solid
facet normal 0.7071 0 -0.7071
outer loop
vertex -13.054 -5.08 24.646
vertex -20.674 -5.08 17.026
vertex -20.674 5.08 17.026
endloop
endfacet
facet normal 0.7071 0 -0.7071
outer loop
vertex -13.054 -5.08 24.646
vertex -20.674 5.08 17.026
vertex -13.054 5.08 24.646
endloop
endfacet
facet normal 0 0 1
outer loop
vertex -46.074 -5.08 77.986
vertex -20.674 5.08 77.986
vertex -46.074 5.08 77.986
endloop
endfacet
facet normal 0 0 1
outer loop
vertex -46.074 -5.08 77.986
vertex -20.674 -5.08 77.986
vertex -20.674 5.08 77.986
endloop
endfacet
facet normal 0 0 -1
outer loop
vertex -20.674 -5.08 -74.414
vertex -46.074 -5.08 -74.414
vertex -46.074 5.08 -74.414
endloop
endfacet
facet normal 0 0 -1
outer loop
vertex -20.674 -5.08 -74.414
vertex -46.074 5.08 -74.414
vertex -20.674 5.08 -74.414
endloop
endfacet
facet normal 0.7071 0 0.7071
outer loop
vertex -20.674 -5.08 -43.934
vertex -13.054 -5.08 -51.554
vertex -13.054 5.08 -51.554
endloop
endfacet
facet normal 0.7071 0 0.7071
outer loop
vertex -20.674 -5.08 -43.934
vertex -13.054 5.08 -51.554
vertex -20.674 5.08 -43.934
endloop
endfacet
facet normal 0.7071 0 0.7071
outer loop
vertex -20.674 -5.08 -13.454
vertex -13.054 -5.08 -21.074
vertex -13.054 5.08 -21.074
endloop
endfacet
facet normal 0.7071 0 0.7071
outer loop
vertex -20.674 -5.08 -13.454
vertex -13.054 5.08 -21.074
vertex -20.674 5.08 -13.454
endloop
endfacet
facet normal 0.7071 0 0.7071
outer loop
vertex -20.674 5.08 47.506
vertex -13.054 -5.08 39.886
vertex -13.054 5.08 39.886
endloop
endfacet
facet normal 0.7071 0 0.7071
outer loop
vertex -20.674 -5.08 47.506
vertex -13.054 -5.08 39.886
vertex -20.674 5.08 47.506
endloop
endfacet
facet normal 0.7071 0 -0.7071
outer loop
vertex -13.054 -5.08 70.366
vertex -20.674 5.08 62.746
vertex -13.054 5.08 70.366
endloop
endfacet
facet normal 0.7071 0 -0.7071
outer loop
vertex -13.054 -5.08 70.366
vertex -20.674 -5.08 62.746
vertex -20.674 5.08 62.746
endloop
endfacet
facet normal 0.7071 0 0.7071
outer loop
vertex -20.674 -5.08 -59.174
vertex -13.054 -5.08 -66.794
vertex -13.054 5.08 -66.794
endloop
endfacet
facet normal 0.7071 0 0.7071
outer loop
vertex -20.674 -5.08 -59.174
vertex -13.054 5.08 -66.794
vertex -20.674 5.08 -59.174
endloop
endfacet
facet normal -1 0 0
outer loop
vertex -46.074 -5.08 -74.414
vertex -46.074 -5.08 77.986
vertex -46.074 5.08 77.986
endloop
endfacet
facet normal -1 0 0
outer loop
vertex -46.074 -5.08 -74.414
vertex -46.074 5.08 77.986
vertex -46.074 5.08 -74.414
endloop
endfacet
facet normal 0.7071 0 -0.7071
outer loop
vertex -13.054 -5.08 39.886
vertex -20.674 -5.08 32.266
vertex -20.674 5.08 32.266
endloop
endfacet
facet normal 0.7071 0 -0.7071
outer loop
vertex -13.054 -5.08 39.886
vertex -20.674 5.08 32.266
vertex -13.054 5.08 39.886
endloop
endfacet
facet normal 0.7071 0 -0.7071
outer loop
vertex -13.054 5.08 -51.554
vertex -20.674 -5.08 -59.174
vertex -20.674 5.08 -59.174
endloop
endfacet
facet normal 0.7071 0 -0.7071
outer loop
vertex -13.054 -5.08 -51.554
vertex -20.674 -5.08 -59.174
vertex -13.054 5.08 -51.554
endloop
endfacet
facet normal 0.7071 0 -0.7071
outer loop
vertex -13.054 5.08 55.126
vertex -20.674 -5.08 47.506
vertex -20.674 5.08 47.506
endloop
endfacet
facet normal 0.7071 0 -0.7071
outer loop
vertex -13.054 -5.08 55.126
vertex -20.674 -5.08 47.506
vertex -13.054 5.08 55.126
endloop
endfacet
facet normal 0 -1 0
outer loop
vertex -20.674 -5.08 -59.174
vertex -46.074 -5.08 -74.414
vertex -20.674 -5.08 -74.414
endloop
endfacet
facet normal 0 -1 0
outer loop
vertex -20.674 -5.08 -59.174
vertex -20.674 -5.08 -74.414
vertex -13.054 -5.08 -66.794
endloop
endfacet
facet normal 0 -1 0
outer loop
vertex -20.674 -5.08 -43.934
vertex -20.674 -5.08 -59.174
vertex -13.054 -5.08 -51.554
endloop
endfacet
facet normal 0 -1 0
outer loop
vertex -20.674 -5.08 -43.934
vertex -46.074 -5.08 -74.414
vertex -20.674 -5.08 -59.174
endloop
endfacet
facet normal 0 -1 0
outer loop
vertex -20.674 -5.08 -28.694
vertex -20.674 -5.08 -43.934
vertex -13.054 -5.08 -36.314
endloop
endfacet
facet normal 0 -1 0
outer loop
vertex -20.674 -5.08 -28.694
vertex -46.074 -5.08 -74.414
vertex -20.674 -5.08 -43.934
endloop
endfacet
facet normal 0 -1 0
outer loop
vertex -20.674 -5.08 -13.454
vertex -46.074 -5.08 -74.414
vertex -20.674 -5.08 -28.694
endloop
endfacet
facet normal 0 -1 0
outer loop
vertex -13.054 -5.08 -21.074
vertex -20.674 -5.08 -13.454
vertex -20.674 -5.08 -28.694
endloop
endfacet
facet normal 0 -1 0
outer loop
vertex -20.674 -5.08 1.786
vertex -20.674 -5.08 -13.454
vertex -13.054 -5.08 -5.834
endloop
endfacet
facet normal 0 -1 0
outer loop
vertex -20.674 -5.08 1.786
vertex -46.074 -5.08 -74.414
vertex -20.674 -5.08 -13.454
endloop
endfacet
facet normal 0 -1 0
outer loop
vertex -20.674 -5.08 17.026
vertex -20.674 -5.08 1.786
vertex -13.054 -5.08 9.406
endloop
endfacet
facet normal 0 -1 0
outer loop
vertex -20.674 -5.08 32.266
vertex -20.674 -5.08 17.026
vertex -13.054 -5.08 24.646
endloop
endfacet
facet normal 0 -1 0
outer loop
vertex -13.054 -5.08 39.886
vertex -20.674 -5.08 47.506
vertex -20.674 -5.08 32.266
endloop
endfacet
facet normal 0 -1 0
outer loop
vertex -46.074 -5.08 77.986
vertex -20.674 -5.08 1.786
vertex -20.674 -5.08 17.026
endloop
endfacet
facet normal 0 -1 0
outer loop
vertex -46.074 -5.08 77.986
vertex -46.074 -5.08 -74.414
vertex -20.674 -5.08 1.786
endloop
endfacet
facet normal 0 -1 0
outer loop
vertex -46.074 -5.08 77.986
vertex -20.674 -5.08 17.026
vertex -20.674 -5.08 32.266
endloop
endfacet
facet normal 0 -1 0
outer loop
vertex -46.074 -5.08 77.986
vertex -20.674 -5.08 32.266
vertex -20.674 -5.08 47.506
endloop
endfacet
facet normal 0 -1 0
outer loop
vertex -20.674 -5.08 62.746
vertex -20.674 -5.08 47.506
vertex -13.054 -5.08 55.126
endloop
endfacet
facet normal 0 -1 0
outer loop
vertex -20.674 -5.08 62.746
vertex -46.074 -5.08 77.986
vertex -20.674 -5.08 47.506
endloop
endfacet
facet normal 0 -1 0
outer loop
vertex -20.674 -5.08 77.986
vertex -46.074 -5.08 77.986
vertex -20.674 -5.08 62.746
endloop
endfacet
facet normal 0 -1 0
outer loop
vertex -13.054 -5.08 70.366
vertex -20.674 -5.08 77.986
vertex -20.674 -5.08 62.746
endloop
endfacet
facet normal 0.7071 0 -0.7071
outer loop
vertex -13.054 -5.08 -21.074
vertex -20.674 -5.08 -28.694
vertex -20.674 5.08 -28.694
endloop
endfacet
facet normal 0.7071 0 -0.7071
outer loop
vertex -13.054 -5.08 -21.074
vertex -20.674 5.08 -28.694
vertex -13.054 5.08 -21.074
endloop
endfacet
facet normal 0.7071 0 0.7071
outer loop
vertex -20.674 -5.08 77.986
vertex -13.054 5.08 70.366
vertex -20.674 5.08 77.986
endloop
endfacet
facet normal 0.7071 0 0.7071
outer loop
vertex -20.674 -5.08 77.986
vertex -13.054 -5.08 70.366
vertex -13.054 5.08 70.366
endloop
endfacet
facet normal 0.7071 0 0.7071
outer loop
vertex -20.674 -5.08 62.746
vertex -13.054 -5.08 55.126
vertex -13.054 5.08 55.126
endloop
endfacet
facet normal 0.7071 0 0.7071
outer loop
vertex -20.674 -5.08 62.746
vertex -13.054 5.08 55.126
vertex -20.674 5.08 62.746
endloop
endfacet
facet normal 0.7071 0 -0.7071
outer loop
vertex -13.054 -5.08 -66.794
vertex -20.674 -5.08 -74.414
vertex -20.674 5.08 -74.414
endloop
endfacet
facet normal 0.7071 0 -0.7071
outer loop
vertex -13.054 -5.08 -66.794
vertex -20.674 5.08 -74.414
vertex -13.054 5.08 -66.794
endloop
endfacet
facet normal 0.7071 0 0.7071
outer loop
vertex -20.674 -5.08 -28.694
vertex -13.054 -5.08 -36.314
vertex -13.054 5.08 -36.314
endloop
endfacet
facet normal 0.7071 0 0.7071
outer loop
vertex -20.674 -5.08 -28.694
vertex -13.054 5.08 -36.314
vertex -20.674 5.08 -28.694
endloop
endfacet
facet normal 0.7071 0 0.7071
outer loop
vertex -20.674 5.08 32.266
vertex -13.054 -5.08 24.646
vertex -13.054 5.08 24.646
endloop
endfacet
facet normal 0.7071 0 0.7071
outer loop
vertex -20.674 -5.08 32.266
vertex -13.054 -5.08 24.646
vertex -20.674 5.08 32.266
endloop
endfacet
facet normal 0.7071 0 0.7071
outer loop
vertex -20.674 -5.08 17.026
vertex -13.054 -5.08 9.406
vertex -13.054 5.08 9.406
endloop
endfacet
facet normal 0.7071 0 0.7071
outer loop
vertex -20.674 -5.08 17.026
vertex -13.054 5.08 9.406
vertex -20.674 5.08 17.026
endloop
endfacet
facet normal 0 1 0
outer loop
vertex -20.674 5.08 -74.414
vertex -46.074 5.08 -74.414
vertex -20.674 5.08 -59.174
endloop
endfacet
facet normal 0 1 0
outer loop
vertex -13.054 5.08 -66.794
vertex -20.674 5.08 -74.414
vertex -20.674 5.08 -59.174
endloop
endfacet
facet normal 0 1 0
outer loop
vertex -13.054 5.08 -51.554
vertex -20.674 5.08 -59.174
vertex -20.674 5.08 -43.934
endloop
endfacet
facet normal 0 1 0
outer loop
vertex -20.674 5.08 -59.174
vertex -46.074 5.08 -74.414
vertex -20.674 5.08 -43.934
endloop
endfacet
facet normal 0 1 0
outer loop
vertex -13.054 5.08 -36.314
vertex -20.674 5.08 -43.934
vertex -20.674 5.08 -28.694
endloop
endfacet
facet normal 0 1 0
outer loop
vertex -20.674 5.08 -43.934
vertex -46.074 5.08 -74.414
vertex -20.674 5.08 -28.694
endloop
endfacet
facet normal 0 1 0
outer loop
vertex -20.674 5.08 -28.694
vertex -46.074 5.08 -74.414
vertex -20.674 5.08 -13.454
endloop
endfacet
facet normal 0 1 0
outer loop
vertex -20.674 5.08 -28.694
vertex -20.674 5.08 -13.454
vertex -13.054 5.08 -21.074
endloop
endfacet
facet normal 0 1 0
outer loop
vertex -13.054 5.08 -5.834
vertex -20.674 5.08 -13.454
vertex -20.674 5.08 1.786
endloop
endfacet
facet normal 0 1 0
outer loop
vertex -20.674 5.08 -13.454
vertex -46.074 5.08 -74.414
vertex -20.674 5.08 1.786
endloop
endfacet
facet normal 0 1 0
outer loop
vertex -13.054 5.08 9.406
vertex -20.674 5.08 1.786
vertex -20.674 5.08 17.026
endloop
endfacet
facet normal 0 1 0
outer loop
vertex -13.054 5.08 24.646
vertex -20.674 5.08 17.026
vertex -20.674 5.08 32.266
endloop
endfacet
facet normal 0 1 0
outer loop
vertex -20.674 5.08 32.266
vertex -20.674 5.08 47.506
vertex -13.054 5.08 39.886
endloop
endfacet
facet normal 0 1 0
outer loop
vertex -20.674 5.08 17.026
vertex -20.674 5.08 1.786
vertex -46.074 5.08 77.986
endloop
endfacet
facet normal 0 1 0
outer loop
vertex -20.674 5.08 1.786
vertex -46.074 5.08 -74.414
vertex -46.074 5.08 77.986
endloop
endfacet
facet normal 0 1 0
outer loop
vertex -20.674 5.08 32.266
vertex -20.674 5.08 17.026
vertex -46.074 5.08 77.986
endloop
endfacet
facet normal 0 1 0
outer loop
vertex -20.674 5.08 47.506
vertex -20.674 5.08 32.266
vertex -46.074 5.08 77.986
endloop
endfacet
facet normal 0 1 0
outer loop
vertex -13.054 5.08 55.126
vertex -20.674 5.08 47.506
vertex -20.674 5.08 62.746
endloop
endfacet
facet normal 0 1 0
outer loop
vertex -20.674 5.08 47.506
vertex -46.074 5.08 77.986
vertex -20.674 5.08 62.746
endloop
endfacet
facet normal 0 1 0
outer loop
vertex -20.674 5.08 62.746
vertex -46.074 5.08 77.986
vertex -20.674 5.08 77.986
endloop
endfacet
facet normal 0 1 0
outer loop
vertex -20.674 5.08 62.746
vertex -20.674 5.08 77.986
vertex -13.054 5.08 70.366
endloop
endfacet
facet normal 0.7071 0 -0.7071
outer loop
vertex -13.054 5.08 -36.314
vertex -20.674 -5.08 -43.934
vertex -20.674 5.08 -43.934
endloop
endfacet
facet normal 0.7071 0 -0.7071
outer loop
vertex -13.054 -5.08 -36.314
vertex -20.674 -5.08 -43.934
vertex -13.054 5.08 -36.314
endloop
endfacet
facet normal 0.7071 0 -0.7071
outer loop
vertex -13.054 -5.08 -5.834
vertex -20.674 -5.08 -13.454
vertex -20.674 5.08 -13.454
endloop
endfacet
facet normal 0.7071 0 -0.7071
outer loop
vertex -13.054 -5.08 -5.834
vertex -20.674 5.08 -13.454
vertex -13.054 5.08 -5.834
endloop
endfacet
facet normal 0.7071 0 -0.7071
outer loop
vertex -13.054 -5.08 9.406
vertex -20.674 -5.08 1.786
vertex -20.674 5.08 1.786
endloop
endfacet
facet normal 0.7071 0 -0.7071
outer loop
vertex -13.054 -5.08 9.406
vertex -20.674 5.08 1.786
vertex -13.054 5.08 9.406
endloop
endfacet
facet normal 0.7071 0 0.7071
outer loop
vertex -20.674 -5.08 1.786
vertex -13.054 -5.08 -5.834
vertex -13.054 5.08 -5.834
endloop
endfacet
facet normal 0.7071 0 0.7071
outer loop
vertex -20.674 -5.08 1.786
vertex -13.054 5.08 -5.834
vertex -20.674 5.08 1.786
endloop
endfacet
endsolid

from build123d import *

# Parameters (mm, degrees)
F1_DEPTH = 5.08


with BuildPart() as f1:
    # F0 (on Front) → F1 (new body, symmetric)
    with BuildSketch(Plane.XZ):
        Polygon((-20.673906, 77.98629), (-46.073906, 77.98629), (-46.073906, -74.41371), (-20.673906, -74.41371), (-13.053906, -66.79371), (-20.673906, -59.17371), (-13.053906, -51.55371), (-20.673906, -43.93371), (-13.053906, -36.31371), (-20.673906, -28.69371), (-13.053906, -21.07371), (-20.673906, -13.45371), (-13.053906, -5.83371), (-20.673906, 1.78629), (-13.053906, 9.40629), (-20.673906, 17.02629), (-13.053906, 24.64629), (-20.673906, 32.26629), (-13.053906, 39.88629), (-20.673906, 47.50629), (-13.053906, 55.12629), (-20.673906, 62.74629), (-13.053906, 70.36629), align=None)
    extrude(amount=F1_DEPTH, both=True)


solid = f1.part
